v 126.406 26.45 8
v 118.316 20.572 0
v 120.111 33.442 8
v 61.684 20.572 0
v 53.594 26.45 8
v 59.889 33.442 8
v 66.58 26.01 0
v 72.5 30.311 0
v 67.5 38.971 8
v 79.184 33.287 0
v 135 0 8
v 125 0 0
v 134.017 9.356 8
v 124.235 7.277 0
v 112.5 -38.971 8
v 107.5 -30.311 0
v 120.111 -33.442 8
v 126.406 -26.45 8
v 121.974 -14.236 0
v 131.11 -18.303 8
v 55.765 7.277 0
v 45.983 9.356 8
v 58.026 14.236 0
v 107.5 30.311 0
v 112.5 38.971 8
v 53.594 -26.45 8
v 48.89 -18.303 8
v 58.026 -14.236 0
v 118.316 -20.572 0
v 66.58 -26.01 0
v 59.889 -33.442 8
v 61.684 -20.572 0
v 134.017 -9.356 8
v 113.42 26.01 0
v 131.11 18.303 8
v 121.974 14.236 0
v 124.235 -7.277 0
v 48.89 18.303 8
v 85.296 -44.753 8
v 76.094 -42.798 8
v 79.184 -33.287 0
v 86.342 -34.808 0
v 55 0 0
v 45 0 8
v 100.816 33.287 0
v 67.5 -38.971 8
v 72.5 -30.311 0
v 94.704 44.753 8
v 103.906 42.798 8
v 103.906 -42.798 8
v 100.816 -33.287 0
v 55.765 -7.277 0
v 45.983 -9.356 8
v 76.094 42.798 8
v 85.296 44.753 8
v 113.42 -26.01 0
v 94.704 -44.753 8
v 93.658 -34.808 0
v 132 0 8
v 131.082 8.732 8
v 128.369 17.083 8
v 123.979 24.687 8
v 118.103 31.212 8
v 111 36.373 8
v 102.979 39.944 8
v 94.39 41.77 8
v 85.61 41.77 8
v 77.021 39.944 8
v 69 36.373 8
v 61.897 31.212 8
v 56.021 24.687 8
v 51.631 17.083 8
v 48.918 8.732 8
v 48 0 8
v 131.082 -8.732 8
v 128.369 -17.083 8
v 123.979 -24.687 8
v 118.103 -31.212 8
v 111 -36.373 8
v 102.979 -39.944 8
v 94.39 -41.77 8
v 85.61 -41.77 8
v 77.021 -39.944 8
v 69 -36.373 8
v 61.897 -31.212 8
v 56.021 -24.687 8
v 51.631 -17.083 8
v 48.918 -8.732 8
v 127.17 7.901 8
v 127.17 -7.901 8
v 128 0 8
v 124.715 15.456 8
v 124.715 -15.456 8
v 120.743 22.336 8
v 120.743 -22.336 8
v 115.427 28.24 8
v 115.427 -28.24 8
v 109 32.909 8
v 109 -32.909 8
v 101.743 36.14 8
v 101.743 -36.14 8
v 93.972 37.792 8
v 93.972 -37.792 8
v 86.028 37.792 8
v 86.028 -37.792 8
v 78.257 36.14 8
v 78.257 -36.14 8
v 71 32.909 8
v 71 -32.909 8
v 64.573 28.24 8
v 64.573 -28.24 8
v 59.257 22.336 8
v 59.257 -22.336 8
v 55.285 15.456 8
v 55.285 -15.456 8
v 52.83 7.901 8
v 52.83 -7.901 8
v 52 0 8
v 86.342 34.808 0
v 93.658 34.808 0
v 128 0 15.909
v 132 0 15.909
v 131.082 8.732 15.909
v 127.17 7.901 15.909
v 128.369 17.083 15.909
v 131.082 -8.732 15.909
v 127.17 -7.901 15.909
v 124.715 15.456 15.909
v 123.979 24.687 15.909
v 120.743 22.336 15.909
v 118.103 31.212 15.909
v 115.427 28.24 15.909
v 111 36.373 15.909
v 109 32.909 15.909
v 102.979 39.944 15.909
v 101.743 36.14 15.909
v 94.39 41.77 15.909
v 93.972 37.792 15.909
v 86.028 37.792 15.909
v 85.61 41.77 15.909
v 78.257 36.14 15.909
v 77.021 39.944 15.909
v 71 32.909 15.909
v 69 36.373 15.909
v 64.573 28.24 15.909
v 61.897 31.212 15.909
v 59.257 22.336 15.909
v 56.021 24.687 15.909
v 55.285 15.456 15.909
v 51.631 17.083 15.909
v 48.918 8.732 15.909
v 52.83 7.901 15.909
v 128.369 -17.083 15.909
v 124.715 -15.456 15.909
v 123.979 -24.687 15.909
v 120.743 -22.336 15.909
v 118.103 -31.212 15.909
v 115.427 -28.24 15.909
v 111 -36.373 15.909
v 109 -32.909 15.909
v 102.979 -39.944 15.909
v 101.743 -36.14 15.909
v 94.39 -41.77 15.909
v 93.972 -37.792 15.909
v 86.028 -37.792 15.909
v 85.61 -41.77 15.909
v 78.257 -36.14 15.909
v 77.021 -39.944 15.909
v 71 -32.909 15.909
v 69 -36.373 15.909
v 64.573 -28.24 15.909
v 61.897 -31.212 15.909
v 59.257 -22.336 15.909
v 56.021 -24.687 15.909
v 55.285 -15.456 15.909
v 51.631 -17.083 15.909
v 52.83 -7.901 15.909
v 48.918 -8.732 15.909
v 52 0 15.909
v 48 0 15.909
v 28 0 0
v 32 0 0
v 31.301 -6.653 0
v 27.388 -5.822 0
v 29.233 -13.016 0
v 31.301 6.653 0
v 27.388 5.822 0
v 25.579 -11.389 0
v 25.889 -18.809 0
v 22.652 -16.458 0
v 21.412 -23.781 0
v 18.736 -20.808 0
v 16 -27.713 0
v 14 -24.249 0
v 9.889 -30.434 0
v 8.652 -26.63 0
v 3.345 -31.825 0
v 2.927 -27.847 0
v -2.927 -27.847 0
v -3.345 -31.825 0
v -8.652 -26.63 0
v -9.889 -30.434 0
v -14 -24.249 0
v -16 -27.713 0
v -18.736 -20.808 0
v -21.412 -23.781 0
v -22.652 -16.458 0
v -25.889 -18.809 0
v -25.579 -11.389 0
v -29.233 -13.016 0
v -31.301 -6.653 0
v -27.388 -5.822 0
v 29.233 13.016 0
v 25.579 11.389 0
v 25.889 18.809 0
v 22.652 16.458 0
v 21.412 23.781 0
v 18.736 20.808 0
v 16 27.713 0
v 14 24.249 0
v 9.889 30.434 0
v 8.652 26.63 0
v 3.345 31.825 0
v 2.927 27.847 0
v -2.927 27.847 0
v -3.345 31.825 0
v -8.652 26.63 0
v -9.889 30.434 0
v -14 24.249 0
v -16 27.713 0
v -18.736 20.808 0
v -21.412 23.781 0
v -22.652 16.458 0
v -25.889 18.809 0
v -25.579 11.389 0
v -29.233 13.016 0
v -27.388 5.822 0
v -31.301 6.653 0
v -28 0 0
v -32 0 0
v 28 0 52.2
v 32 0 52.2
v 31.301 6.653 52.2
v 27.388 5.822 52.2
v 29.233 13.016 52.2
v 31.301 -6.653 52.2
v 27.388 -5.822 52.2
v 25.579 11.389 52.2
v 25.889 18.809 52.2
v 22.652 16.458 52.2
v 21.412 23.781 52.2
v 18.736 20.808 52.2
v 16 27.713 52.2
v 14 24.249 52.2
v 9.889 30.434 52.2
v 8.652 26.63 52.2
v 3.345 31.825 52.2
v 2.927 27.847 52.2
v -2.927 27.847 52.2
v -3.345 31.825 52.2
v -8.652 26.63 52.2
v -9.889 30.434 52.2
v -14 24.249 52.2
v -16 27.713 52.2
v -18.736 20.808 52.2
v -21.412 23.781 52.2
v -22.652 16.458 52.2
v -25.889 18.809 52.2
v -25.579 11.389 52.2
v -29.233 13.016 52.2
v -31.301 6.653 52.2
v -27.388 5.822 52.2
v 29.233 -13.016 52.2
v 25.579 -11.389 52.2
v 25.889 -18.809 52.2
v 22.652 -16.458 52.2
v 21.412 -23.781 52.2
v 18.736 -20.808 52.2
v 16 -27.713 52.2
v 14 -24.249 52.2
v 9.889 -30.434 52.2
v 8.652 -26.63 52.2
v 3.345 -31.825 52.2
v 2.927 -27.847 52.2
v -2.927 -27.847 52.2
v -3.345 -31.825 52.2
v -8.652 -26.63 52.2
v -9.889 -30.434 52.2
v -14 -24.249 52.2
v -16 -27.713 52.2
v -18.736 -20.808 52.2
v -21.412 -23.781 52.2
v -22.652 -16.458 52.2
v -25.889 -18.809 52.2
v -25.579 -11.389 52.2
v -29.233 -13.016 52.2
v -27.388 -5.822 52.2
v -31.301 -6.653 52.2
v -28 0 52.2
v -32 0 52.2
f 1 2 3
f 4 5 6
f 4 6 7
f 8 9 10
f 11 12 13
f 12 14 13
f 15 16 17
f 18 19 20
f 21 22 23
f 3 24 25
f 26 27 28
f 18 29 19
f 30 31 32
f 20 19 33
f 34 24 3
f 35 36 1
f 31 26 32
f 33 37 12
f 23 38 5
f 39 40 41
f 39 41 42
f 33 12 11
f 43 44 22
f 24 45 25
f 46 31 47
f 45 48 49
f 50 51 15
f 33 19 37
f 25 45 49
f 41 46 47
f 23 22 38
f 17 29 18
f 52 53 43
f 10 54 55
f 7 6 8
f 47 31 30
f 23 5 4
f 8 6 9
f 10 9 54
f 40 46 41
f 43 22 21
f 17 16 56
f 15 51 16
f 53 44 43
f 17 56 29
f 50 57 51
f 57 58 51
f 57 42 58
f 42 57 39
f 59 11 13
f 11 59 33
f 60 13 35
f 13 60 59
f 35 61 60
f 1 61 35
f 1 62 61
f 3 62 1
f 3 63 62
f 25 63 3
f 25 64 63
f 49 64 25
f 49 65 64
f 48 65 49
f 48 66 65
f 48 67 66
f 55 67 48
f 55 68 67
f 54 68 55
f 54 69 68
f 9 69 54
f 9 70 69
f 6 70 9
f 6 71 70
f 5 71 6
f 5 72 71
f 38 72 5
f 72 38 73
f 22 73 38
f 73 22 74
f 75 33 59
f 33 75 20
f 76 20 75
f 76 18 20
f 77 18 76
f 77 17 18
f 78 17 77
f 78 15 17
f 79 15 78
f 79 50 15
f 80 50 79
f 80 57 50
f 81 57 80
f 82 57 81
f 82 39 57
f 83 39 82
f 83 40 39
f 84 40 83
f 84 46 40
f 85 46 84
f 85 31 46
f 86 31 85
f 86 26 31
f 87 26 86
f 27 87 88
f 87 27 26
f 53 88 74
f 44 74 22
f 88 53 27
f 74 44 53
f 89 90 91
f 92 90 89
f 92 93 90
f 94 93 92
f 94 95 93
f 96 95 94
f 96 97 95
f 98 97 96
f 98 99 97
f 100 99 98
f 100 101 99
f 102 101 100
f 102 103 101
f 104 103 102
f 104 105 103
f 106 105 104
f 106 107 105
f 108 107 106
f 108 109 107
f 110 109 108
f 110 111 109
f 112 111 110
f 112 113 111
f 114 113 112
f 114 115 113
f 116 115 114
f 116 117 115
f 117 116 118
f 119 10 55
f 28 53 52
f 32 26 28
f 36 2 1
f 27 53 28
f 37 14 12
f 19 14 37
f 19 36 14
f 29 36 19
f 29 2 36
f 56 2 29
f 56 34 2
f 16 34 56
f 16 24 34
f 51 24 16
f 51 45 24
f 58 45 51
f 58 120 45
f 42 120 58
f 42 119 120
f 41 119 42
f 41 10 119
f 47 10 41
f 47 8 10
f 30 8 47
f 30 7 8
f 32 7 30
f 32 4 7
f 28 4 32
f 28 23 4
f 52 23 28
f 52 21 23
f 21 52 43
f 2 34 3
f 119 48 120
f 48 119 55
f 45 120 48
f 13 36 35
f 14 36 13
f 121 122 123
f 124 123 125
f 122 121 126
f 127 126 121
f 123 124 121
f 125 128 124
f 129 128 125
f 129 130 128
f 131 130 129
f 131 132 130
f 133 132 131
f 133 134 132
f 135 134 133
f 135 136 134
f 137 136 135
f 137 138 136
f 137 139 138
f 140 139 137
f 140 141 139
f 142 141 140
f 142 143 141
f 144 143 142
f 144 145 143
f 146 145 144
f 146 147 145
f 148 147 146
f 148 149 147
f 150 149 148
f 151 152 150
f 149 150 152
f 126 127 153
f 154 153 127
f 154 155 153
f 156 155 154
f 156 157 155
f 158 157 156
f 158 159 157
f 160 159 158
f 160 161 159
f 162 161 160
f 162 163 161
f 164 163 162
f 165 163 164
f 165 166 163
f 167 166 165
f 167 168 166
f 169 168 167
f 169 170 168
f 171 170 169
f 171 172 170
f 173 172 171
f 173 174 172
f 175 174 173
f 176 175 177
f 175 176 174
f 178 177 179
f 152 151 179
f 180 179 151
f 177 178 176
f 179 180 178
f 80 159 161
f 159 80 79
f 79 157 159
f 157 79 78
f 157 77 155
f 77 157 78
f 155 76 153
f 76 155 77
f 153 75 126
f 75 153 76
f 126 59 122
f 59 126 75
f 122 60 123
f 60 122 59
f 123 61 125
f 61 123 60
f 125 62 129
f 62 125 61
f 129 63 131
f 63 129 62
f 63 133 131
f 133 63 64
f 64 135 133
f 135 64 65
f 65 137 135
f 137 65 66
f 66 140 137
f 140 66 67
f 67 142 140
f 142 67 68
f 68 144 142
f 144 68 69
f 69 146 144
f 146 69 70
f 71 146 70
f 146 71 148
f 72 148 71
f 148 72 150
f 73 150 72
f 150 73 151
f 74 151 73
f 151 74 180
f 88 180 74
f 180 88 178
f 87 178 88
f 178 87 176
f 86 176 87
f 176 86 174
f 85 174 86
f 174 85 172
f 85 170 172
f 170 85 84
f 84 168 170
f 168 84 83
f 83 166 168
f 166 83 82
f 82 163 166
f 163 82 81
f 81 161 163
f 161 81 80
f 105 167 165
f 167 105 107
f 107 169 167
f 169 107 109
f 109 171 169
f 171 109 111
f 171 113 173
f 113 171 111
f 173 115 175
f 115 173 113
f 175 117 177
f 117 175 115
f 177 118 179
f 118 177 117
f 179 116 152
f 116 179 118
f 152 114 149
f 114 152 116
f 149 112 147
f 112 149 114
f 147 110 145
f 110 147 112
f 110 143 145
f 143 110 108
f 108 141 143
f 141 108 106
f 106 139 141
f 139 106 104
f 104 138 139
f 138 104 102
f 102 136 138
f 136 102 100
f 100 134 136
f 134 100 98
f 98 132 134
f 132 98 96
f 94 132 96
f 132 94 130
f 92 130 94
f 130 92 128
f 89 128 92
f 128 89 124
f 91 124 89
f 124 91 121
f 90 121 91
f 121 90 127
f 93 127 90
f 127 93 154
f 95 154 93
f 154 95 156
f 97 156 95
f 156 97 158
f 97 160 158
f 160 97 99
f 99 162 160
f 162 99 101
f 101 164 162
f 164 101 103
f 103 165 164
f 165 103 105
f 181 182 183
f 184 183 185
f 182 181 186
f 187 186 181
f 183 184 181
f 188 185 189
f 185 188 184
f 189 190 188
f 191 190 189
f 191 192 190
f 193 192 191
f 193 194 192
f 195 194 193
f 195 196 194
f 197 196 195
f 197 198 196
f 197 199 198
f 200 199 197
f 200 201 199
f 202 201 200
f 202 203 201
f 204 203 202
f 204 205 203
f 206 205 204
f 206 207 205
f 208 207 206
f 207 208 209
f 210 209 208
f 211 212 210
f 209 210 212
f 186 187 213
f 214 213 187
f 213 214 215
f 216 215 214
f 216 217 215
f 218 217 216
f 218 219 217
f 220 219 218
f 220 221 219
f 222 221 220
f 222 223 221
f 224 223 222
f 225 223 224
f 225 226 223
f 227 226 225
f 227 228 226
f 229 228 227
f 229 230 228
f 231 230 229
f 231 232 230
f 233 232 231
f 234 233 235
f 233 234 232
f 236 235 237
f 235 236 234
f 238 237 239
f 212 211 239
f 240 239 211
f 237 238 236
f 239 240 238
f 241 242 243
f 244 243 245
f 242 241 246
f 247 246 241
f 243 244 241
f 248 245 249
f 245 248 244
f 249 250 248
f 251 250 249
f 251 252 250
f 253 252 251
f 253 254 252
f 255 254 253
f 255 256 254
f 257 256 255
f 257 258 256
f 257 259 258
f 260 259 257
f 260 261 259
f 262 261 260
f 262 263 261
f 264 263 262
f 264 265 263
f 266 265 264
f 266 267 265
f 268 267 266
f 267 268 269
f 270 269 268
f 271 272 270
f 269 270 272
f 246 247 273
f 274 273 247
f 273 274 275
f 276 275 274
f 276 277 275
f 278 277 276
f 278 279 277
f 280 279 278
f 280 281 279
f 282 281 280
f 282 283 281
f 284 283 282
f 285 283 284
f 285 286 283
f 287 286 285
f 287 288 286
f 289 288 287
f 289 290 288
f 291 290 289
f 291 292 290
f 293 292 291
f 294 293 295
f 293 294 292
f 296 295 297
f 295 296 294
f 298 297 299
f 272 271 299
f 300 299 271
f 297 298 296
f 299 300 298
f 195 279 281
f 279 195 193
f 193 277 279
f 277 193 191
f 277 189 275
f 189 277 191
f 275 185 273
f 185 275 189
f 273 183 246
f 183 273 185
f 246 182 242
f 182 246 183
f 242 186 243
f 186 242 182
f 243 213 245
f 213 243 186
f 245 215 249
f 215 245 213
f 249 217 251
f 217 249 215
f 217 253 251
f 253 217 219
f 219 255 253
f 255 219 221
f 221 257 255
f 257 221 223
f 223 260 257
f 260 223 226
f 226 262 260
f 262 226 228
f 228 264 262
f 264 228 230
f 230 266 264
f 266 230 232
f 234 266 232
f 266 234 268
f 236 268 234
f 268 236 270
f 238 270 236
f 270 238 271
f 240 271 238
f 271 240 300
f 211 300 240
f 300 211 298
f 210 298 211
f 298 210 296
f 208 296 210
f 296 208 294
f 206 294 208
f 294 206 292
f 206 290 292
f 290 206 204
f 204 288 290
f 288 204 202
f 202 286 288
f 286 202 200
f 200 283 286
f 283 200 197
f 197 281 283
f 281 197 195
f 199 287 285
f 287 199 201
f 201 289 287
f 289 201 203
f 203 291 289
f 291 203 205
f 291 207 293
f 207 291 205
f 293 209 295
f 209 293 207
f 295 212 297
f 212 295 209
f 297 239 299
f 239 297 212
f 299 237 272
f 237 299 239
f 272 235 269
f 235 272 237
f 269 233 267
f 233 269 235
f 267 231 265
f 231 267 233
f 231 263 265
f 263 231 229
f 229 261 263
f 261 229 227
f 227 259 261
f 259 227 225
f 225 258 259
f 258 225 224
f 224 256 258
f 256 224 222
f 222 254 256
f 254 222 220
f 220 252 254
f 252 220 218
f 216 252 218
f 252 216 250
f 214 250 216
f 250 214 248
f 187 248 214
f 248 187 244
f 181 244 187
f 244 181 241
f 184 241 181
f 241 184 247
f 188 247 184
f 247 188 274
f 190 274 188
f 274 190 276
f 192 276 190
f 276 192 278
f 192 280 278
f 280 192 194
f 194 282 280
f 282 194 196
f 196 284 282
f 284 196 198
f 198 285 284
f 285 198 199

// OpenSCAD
//Created by Ari M. Diacou, February 2014
//Shared under Creative Commons License: Attribution 3.0 Unported (CC BY-SA 3.0) 
//see http://creativecommons.org/licenses/by-sa/3.0/

/* [Base] */
//A way to save your "random" arrangement
master_seed=13;
//Number of intersections forming a block
n=8;
//reduces the ablity of higher n to cut away all the block, I like -0.4.
power=-.4; //[-1,-0.9,-0.8,-0.7,-0.6,-0.5,-0.4,-0.3,-0.2,-0.1,0]
//Maximum angle of block intersections
max_angle=15;
//How many blocks form a circle?
blocks_per_rev=12;
//Number of layers of blocks in the turret base
height=6;
//The height of each block in mm
block_height=4;
//The radial width of a block in mm
block_thickness=10;
//The internal radius of the turret in mm
turret_radius=25;
//How much curviness do you want?
$fn=30;
//<1 Compresses layers, >1 expands them to show mortar
z_spacing=1.1;
//<1 Compresses layers, >1 expands them to show mortar
theta_expansion=1.0;
//Mortar thickeness divided by Block thickness, if you dont want, hit zero.
mortar_thickness=.4;

/* [Top] */
//Do you want a top?
care="yes";//[yes,no]
//Do 45 degree overhangs scare you?
noob="no";//[yes,no]
//How many blocks wide do you want the lookout stones?
factor=1.5;

/* [Hidden] */
stone="silver";
grout="ghostwhite";
rad=turret_radius;
num=blocks_per_rev;
union(){
	color(stone) base();
	if(mortar_thickness>.01){
		color(grout) 
			mortar(turret_radius,mortar_thickness);
		}
	}
if (care=="yes") {crown();}

module crown(){
	phase=360/num*(ceil(factor)-factor)/1;
	if(noob=="no"){
		translate([2*rad+4*block_thickness,0,3*block_height]) union(){
			//The conical base
			translate([0,0,-3*block_height]) 
				color(stone) cylinder(2*block_height,turret_radius+block_thickness,turret_radius+2*block_thickness);
			//The middle stones
			for(i=[1:num]){
				rotate( i * 360 / num, [0,0,1])	
					color(stone) wedge5(turret_radius+block_thickness,block_thickness,360/num,block_height, master_seed+i);
				}
			//The mortar
			if(mortar_thickness>.01){
				translate([0,0,-1*block_height])	
					scale([1,1,1/(height*z_spacing)])
						color(grout) mortar(turret_radius+block_thickness,mortar_thickness);
				}
			//The crenelations
			for(i=[1:num/2]){ 
				//Crenelations
				translate([0,0,2*block_height])	
					rotate( phase+i * 720 / num, [0,0,1])	
						color(stone) wedge5(turret_radius+block_thickness,block_thickness,(360*factor)/num,block_height,master_seed+num+i);
				}
			}
		}
	if(noob=="yes"){
		translate([2*rad+4*block_thickness,0,1*block_height]) union(){
			//The middle stones
			for(i=[1:num]){
				rotate( i * 360 / num, [0,0,1])	
					color(stone) wedge5(turret_radius+block_thickness,block_thickness,360/num,block_height, master_seed+i);
				}
			//The mortar
			translate([0,0,-1*block_height])	
				scale([1,1,1/(height*z_spacing)])
					color(grout) mortar(turret_radius+block_thickness,mortar_thickness);
			//The crenelations
			for(i=[1:num/2]){ 
				//Crenelations
				translate([0,0,2*block_height])	
					rotate( phase+i * 720 / num, [0,0,1])	
						color(stone) wedge5(turret_radius+block_thickness,block_thickness,(360*factor)/num,block_height,master_seed+num+i);
				}
			}
		//The conical base
		translate([0,2*rad+4*block_thickness,0])
			color(stone) cylinder(2*block_height,turret_radius+2*block_thickness,turret_radius+block_thickness);
		}
	}

module base(){
	for(h=[0:height-1]){
		rotate([0,0,90*(pow(-1,h))/num]) 
			translate([0,0,(h+.5)*block_height*2*z_spacing]) 
				union(){
					for(i=[1:num]){
					   rotate( i * 360 / num, [0,0,1])	
							wedge5(turret_radius,block_thickness,360*theta_expansion/num,block_height,master_seed+i+num*h);
						}
					}
		}
	}

module mortar(radius,thickness){
	//Makes a hollow cylinder in the middle of the bricks of the 
	inner_radius=radius+(1-thickness)*block_thickness/2;
	outer_radius=thickness*block_thickness;
	//translate([0,0,-block_height])
	linear_extrude(height=2*height*block_height*(z_spacing)-height*(z_spacing-1)){
		difference(){
			circle(inner_radius+outer_radius);
			circle(inner_radius);
			}
		}
	}

module wedge5(inner,width,theta,thickness,seed){
	//inner		=inner radius of arch/circle
	//width		=radial distance of block
	//theta		=angle subtended by block
	//thickness	=height of block
	random=rands(-1,1,n*3,seed);
	intersection(){
		wedge_boundary(inner,width,theta,thickness);
		correct(inner, width)	translate([inner+width/2,0,0])
			intersection_for(i=[0:n-1]){
				rotate([	max_angle*random[3*i]*pow(i*(thickness/inner),power),
							.7*max_angle*random[3*i+1]*pow(i,power),
							max_angle*random[3*i+2]*pow(i*(inner/width),power)])
					cube([width, sqrt((4*inner*tan(theta/2))*(width)), sqrt((4*inner*tan(theta/2))*(thickness))], center=true);
				}
		}	
	}

module correct(inner, width){
	//mirrors an object about its yz plane, which necessarily must be done is this ugly way
	translate([inner+width/2,0,0])
		mirror([1,0,0])
			translate([-inner-width/2,0,0])
				child(0);
	}

module wedge_boundary(inner,width,theta,thickness){
	//Creates a pie slice of theta degrees that has a radius of inner+width. Used to make sure that the wedge does not over-extend the angle it is supposed to.
	intersection(){
		rotate([0,0,-theta/2]) 
			translate([(inner+width)/2,(inner+width)/2,0])
				cube([inner+width,inner+width,2*thickness],center=true);
		rotate([0,0,theta/2]) 
			translate([(inner+width)/2,-(inner+width)/2,0])
				cube([inner+width,inner+width,2*thickness],center=true);
		}
	}
